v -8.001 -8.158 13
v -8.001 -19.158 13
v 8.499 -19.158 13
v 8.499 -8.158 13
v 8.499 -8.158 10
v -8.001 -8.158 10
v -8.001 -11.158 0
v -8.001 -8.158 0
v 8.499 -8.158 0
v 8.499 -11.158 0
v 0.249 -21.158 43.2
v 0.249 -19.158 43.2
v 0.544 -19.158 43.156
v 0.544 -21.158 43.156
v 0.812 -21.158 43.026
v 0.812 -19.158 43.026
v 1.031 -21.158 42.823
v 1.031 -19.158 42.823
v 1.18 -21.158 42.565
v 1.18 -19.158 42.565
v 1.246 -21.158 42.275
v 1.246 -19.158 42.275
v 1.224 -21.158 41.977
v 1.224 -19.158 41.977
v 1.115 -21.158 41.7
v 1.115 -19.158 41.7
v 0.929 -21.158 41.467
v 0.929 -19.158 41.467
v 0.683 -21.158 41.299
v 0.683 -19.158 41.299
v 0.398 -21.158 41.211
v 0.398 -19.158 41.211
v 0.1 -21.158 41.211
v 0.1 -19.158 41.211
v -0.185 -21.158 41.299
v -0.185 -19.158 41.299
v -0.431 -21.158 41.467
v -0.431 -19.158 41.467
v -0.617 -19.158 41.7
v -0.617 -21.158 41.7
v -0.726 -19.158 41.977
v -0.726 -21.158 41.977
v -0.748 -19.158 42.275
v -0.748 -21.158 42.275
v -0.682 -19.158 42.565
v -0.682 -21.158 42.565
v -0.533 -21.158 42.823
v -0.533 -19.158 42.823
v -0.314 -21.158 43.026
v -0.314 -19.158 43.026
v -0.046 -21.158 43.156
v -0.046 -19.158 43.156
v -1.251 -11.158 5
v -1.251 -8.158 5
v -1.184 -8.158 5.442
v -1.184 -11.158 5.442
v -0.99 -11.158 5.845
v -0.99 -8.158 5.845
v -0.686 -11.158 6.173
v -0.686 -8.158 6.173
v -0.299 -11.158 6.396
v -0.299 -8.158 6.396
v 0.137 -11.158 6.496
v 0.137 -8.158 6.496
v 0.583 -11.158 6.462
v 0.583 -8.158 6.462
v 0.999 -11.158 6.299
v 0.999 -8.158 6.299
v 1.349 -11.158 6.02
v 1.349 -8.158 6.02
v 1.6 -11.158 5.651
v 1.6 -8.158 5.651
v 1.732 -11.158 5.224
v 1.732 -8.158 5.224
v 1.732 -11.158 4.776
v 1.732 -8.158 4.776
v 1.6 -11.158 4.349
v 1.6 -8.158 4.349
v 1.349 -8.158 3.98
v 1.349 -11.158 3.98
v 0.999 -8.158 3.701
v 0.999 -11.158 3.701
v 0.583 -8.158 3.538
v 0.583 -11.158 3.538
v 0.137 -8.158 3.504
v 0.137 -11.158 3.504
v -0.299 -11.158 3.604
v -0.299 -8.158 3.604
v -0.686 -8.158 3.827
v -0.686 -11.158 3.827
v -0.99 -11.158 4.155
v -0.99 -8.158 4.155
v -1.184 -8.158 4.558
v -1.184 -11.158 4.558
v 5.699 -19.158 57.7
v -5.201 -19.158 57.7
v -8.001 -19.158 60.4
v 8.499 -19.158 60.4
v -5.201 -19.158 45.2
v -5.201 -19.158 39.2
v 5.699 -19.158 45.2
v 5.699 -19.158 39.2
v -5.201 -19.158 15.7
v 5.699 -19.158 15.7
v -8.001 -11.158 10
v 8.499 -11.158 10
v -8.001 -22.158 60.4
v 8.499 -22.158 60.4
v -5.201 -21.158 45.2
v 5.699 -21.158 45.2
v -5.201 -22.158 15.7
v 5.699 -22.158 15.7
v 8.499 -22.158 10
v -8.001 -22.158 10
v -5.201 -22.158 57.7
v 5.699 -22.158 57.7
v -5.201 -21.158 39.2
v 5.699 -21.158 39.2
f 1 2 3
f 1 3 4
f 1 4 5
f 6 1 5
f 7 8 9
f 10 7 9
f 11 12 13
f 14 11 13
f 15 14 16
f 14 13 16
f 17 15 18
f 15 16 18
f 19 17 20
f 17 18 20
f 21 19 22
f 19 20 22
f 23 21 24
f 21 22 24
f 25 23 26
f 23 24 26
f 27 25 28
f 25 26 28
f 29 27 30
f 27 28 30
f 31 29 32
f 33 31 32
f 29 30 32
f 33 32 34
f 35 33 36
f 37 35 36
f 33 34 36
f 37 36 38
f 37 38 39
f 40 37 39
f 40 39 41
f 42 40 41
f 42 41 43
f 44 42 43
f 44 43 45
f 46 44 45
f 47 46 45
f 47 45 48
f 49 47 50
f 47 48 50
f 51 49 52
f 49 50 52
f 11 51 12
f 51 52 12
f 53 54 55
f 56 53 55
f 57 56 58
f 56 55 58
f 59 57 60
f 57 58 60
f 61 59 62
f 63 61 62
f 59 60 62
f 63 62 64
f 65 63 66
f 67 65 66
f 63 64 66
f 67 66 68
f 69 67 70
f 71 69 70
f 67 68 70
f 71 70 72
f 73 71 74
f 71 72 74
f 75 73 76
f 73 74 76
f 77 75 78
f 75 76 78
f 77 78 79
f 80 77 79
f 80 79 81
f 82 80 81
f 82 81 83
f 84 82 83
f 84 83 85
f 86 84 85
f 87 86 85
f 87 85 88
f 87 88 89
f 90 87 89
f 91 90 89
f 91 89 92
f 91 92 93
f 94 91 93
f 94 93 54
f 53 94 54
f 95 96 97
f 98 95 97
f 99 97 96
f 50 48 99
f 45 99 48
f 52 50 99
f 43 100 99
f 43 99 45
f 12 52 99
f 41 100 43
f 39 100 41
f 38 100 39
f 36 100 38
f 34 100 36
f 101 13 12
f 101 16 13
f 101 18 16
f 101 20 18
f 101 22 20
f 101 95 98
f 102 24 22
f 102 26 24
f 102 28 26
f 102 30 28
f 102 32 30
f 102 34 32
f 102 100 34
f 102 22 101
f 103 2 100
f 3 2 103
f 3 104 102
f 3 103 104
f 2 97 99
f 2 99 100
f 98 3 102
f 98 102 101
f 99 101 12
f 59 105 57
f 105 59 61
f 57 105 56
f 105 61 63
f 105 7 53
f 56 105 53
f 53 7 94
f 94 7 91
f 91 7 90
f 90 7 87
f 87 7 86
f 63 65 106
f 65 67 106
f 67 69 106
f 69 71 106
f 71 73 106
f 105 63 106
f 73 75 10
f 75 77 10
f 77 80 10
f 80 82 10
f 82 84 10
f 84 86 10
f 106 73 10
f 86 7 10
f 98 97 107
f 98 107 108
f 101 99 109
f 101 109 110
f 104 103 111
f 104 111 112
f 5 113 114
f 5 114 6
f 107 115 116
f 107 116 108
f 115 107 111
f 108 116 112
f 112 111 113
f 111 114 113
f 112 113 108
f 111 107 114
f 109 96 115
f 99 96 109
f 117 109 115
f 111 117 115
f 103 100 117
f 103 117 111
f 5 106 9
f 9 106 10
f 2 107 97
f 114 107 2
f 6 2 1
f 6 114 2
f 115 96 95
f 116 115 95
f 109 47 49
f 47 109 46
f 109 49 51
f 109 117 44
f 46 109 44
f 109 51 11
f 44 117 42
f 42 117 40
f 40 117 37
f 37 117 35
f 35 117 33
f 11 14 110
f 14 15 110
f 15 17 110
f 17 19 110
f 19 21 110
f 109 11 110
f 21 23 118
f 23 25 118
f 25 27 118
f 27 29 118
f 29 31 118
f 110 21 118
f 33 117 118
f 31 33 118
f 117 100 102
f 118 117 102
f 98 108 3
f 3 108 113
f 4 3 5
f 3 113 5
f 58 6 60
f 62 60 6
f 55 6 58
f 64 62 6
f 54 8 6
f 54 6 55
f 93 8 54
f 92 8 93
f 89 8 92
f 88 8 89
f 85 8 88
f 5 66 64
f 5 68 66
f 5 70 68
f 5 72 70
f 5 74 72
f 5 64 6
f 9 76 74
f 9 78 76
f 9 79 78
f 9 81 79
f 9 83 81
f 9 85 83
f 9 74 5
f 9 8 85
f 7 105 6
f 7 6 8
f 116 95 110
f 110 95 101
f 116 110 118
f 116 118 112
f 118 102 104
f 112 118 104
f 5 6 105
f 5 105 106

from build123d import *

# Parameters (mm, degrees)
SKETCH1_W               = 170
SKETCH1_H               = 3
BOSS_EXTRUDE1_DEPTH     = 10
SKETCH4_R               = 1.2
CUT_EXTRUDE1_DEPTH      = 21
SKETCH2_W               = 45.3
SKETCH2_H               = 3
BOSS_EXTRUDE6_DEPTH     = 20.3
SKETCH5_R               = 8.5
CUT_EXTRUDE2_DEPTH      = 20.3
SKETCH6_W               = 45.3
SKETCH6_H               = 3
BOSS_EXTRUDE7_DEPTH     = 20.3
SKETCH7_R               = 8.5
CUT_EXTRUDE3_DEPTH      = 100.885733504
SKETCH11_W              = 3
SKETCH11_H              = 14
BOSS_EXTRUDE10_DEPTH    = 16.5
SKETCH12_W              = 16.5
SKETCH12_H              = 3
BOSS_EXTRUDE11_DEPTH    = 47.4
SKETCH13_W              = 10.9
SKETCH13_H              = 42
CUT_EXTRUDE5_DEPTH      = 120.823102106
SKETCH14_W              = 23
SKETCH14_H              = 3
BOSS_EXTRUDE12_DEPTH    = 9.5
SKETCH15_W              = 17
SKETCH15_H              = 3.5
CUT_EXTRUDE6_DEPTH      = 9.5
CUT_EXTRUDE7_DEPTH      = 124.643656623
CUT_EXTRUDE7_DEPTH_BACK = 124.643656623
SKETCH16_W              = 63.359581381
SKETCH16_H              = 20.22579087
SKETCH16_W_2            = 63.3
SKETCH16_H_2            = 23.873064633
CUT_EXTRUDE9_DEPTH      = 85.468149706
CUT_EXTRUDE9_DEPTH_BACK = 85.468149706
SKETCH17_W              = 10.34603958
SKETCH17_H              = 19.965926612
SKETCH18_R              = 1.5
CUT_EXTRUDE10_DEPTH     = 10
SKETCH22_W              = 30.660472615
SKETCH22_H              = 85.471317495
CUT_EXTRUDE14_DEPTH     = 85.468149706
SKETCH23_W              = 30.27196453
SKETCH23_H              = 7.283480188
CUT_EXTRUDE15_DEPTH     = 74.568083116
SKETCH24_W              = 10.9
SKETCH24_H              = 6
SKETCH24_R              = 1
BOSS_EXTRUDE13_DEPTH    = 2


with BuildPart() as part:
    # Sketch1 → Boss-Extrude1 (new body)
    with BuildSketch(Plane.XY):
        with Locations((13.639372454, -9.657761352)):
            Rectangle(SKETCH1_W, SKETCH1_H)
    extrude(amount=BOSS_EXTRUDE1_DEPTH)

    # Sketch4 → Cut-Extrude1 (cut)
    with BuildSketch(Plane(origin=(0, -8.157761352, 0), x_dir=(1, 0, 0), z_dir=(0, 1, 0))):
        with Locations(Location((-63.360627546, -4.938536908, 0), (0, 0, 180))):
            Circle(SKETCH4_R)
        with Locations(Location((90.639372454, -5.283238547, 0), (0, 0, 180))):
            Circle(SKETCH4_R)
    extrude(amount=-CUT_EXTRUDE1_DEPTH, mode=Mode.SUBTRACT)

    # Sketch2 → Boss-Extrude6 (add)
    with BuildSketch(Plane(origin=(0, -8.157761352, 0), x_dir=(1, 0, 0), z_dir=(0, 1, 0))):
        with Locations((-30.710627546, -8.5)):
            Rectangle(SKETCH2_W, SKETCH2_H)
    extrude(amount=BOSS_EXTRUDE6_DEPTH)

    # Sketch5 → Cut-Extrude2 (cut)
    with BuildSketch(Plane(origin=(0, 0, 7), x_dir=(-1, 0, 0), z_dir=(0, 0, -1))):
        with Locations((17.460627546, 1.942238648)):
            Circle(SKETCH5_R)
        with Locations((43.960627546, 1.942238648)):
            Circle(SKETCH5_R)
        with BuildLine():
            Line((27.510627546, -3.557761352), (33.910627546, -3.557761352))
            ThreePointArc((33.910627546, -3.557761352), (35.810627546, -5.457761352), (33.910627546, -7.357761352))
            Line((33.910627546, -7.357761352), (27.510627546, -7.357761352))
            ThreePointArc((27.510627546, -7.357761352), (25.610627546, -5.457761352), (27.510627546, -3.557761352))
        make_face()
    extrude(amount=-CUT_EXTRUDE2_DEPTH, mode=Mode.SUBTRACT)

    # Sketch6 → Boss-Extrude7 (add)
    with BuildSketch(Plane(origin=(0, -8.157761352, 0), x_dir=(1, 0, 0), z_dir=(0, 1, 0))):
        with Locations((57.989372454, -8.5)):
            Rectangle(SKETCH6_W, SKETCH6_H)
    extrude(amount=BOSS_EXTRUDE7_DEPTH)

    # Sketch7 → Cut-Extrude3 (cut, through all)
    with BuildSketch(Plane.XY.offset(10)):
        with Locations((44.739372454, 1.942238648)):
            Circle(SKETCH7_R)
        with Locations((71.239372454, 1.942238648)):
            Circle(SKETCH7_R)
        with BuildLine():
            Line((54.839372454, -3.557761352), (61.239372454, -3.557761352))
            ThreePointArc((61.239372454, -3.557761352), (63.139372454, -5.457761352), (61.239372454, -7.357761352))
            Line((61.239372454, -7.357761352), (54.839372454, -7.357761352))
            ThreePointArc((54.839372454, -7.357761352), (52.939372454, -5.457761352), (54.839372454, -3.557761352))
        make_face()
    extrude(amount=-CUT_EXTRUDE3_DEPTH, mode=Mode.SUBTRACT)


with BuildPart() as body_2:
    # Sketch11 → Boss-Extrude10 (new body)
    with BuildSketch(Plane(origin=(98.639372454, 0, 0), x_dir=(0, 0, -1), z_dir=(1, 0, 0))):
        with Locations((-11.5, -15.157761352)):
            Rectangle(SKETCH11_W, SKETCH11_H)
    extrude(amount=BOSS_EXTRUDE10_DEPTH)


with BuildPart() as body_2_1:
    # Body-Move/Copy1: moved
    add(body_2.part.moved(Location((-106.640418619, 0, 0))))

    # Sketch12 → Boss-Extrude11 (add)
    with BuildSketch(Plane.XY.offset(13)):
        with Locations((0.248953835, -20.657761352)):
            Rectangle(SKETCH12_W, SKETCH12_H)
    extrude(amount=BOSS_EXTRUDE11_DEPTH)

    # Sketch13 → Cut-Extrude5 (cut, through all)
    with BuildSketch(Plane(origin=(0, -19.157761352, 0), x_dir=(1, 0, 0), z_dir=(0, 1, 0))):
        with Locations((0.248953835, -36.7)):
            Rectangle(SKETCH13_W, SKETCH13_H)
    extrude(amount=-CUT_EXTRUDE5_DEPTH, mode=Mode.SUBTRACT)


with BuildPart() as body_3:
    # Body-Move/Copy3: copy of body 2
    add(body_2_1.part.moved(Location((26.84603958, 0, 0))))


with BuildPart() as body_4:
    # Sketch14 → Boss-Extrude12 (new body)
    with BuildSketch(Plane(origin=(0, -19.157761352, 0), x_dir=(1, 0, 0), z_dir=(0, 1, 0))):
        with Locations((-0.888899403, -70.178295355)):
            Rectangle(SKETCH14_W, SKETCH14_H)
    extrude(amount=-BOSS_EXTRUDE12_DEPTH)

    # Sketch15 → Cut-Extrude6 (cut)
    with BuildSketch(Plane.XY.offset(71.678295355)):
        with Locations((-0.888899403, -23.907761352)):
            Rectangle(SKETCH15_W, SKETCH15_H)
    extrude(amount=-CUT_EXTRUDE6_DEPTH, mode=Mode.SUBTRACT)


with BuildPart() as body_5:
    # Body-Move/Copy4: copy of body 4
    add(body_4.part.moved(Location((29.098347772, 0, 0))))


with BuildPart() as cut_extrude7_tool:
    # Sketch16 → Cut-Extrude7 (new, two sides: drawn at the far end of the back side and taken through both)
    with BuildSketch(Plane(origin=(0, -8.157761352, 0), x_dir=(1, 0, 0), z_dir=(0, 1, 0)).offset(-CUT_EXTRUDE7_DEPTH_BACK)):
        with Locations((-39.680836856, -5.049901743)):
            Rectangle(SKETCH16_W, SKETCH16_H)
        with Locations((66.989372454, -3.392050033)):
            Rectangle(SKETCH16_W_2, SKETCH16_H_2)
    extrude(amount=CUT_EXTRUDE7_DEPTH + CUT_EXTRUDE7_DEPTH_BACK)


with BuildPart() as part_1:
    add(part.part)

    # Cut-Extrude7: cut by cut_extrude7_tool
    add(cut_extrude7_tool.part, mode=Mode.SUBTRACT)

    # Sketch17 → Cut-Extrude9 (cut, two sides: drawn at the far end of the back side and taken through both)
    with BuildSketch(Plane(origin=(0, -8.157761352, 0), x_dir=(1, 0, 0), z_dir=(0, 1, 0)).offset(-CUT_EXTRUDE9_DEPTH_BACK)):
        with Locations((13.671973625, -0.017036694)):
            Rectangle(SKETCH17_W, SKETCH17_H)
    extrude(amount=CUT_EXTRUDE9_DEPTH + CUT_EXTRUDE9_DEPTH_BACK, mode=Mode.SUBTRACT)


with BuildPart() as body_3_1:
    add(body_3.part)

    # Cut-Extrude7: cut by cut_extrude7_tool
    add(cut_extrude7_tool.part, mode=Mode.SUBTRACT)


with BuildPart() as cut_extrude9_piece_1:
    # of the separate pieces the step leaves, piece 1, a body of its own (cut_extrude9_pieces)
    add(part_1.part.solids().sort_by_distance((8.498953835, -11.157761352, 0))[0])


with BuildPart() as cut_extrude9_piece_2:
    # of the separate pieces the step leaves, piece 2, a body of its own (cut_extrude9_pieces)
    add(part_1.part.solids().sort_by_distance((35.339372454, -11.157761352, 0))[0])


with BuildPart() as cut_extrude10_tool:
    # Sketch18 → Cut-Extrude10 (new body)
    with BuildSketch(Plane(origin=(0, -8.157761352, 0), x_dir=(1, 0, 0), z_dir=(0, 1, 0))):
        with Locations(Location((0.248953835, -5, 0), (0, 0, 180))):
            Circle(SKETCH18_R)
        with Locations(Location((27.094993415, -5, 0), (0, 0, 180))):
            Circle(SKETCH18_R)
    extrude(amount=-CUT_EXTRUDE10_DEPTH)


with BuildPart() as cut_extrude9_piece_1_1:
    add(cut_extrude9_piece_1.part)

    # Cut-Extrude10: cut by cut_extrude10_tool
    add(cut_extrude10_tool.part, mode=Mode.SUBTRACT)


with BuildPart() as cut_extrude9_piece_2_1:
    add(cut_extrude9_piece_2.part)

    # Cut-Extrude10: cut by cut_extrude10_tool
    add(cut_extrude10_tool.part, mode=Mode.SUBTRACT)


with BuildPart() as cut_extrude14_tool:
    # Sketch22 → Cut-Extrude14 (new, through all)
    with BuildSketch(Plane(origin=(0, -8.157761352, 0), x_dir=(1, 0, 0), z_dir=(0, 1, 0))):
        with Locations((30.670536688, -31.705614743)):
            Rectangle(SKETCH22_W, SKETCH22_H)
    extrude(amount=-CUT_EXTRUDE14_DEPTH)


with BuildPart() as body_3_2:
    add(body_3_1.part)

    # Cut-Extrude14: cut by cut_extrude14_tool
    add(cut_extrude14_tool.part, mode=Mode.SUBTRACT)


with BuildPart() as body_5_1:
    add(body_5.part)

    # Cut-Extrude14: cut by cut_extrude14_tool
    add(cut_extrude14_tool.part, mode=Mode.SUBTRACT)


with BuildPart() as cut_extrude9_piece_2_2:
    add(cut_extrude9_piece_2_1.part)

    # Cut-Extrude14: cut by cut_extrude14_tool
    add(cut_extrude14_tool.part, mode=Mode.SUBTRACT)


with BuildPart() as body_4_1:
    add(body_4.part)

    # Sketch23 → Cut-Extrude15 (cut, through all)
    with BuildSketch(Plane(origin=(0, -19.157761352, 0), x_dir=(1, 0, 0), z_dir=(0, 1, 0))):
        with Locations((-0.513403302, -70.531997743)):
            Rectangle(SKETCH23_W, SKETCH23_H)
    extrude(amount=-CUT_EXTRUDE15_DEPTH, mode=Mode.SUBTRACT)


with BuildPart() as body_2_2:
    add(body_2_1.part)

    # Sketch24 → Boss-Extrude13 (add)
    with BuildSketch(Plane(origin=(0, -19.157761352, 0), x_dir=(1, 0, 0), z_dir=(0, 1, 0))):
        with Locations((0.248953835, -42.2)):
            Rectangle(SKETCH24_W, SKETCH24_H)
        with Locations(Location((0.248953835, -42.2, 0), (0, 0, 270))):
            Circle(SKETCH24_R, mode=Mode.SUBTRACT)
    extrude(amount=-BOSS_EXTRUDE13_DEPTH)


solid = Compound([cut_extrude9_piece_1_1.part, body_2_2.part])
